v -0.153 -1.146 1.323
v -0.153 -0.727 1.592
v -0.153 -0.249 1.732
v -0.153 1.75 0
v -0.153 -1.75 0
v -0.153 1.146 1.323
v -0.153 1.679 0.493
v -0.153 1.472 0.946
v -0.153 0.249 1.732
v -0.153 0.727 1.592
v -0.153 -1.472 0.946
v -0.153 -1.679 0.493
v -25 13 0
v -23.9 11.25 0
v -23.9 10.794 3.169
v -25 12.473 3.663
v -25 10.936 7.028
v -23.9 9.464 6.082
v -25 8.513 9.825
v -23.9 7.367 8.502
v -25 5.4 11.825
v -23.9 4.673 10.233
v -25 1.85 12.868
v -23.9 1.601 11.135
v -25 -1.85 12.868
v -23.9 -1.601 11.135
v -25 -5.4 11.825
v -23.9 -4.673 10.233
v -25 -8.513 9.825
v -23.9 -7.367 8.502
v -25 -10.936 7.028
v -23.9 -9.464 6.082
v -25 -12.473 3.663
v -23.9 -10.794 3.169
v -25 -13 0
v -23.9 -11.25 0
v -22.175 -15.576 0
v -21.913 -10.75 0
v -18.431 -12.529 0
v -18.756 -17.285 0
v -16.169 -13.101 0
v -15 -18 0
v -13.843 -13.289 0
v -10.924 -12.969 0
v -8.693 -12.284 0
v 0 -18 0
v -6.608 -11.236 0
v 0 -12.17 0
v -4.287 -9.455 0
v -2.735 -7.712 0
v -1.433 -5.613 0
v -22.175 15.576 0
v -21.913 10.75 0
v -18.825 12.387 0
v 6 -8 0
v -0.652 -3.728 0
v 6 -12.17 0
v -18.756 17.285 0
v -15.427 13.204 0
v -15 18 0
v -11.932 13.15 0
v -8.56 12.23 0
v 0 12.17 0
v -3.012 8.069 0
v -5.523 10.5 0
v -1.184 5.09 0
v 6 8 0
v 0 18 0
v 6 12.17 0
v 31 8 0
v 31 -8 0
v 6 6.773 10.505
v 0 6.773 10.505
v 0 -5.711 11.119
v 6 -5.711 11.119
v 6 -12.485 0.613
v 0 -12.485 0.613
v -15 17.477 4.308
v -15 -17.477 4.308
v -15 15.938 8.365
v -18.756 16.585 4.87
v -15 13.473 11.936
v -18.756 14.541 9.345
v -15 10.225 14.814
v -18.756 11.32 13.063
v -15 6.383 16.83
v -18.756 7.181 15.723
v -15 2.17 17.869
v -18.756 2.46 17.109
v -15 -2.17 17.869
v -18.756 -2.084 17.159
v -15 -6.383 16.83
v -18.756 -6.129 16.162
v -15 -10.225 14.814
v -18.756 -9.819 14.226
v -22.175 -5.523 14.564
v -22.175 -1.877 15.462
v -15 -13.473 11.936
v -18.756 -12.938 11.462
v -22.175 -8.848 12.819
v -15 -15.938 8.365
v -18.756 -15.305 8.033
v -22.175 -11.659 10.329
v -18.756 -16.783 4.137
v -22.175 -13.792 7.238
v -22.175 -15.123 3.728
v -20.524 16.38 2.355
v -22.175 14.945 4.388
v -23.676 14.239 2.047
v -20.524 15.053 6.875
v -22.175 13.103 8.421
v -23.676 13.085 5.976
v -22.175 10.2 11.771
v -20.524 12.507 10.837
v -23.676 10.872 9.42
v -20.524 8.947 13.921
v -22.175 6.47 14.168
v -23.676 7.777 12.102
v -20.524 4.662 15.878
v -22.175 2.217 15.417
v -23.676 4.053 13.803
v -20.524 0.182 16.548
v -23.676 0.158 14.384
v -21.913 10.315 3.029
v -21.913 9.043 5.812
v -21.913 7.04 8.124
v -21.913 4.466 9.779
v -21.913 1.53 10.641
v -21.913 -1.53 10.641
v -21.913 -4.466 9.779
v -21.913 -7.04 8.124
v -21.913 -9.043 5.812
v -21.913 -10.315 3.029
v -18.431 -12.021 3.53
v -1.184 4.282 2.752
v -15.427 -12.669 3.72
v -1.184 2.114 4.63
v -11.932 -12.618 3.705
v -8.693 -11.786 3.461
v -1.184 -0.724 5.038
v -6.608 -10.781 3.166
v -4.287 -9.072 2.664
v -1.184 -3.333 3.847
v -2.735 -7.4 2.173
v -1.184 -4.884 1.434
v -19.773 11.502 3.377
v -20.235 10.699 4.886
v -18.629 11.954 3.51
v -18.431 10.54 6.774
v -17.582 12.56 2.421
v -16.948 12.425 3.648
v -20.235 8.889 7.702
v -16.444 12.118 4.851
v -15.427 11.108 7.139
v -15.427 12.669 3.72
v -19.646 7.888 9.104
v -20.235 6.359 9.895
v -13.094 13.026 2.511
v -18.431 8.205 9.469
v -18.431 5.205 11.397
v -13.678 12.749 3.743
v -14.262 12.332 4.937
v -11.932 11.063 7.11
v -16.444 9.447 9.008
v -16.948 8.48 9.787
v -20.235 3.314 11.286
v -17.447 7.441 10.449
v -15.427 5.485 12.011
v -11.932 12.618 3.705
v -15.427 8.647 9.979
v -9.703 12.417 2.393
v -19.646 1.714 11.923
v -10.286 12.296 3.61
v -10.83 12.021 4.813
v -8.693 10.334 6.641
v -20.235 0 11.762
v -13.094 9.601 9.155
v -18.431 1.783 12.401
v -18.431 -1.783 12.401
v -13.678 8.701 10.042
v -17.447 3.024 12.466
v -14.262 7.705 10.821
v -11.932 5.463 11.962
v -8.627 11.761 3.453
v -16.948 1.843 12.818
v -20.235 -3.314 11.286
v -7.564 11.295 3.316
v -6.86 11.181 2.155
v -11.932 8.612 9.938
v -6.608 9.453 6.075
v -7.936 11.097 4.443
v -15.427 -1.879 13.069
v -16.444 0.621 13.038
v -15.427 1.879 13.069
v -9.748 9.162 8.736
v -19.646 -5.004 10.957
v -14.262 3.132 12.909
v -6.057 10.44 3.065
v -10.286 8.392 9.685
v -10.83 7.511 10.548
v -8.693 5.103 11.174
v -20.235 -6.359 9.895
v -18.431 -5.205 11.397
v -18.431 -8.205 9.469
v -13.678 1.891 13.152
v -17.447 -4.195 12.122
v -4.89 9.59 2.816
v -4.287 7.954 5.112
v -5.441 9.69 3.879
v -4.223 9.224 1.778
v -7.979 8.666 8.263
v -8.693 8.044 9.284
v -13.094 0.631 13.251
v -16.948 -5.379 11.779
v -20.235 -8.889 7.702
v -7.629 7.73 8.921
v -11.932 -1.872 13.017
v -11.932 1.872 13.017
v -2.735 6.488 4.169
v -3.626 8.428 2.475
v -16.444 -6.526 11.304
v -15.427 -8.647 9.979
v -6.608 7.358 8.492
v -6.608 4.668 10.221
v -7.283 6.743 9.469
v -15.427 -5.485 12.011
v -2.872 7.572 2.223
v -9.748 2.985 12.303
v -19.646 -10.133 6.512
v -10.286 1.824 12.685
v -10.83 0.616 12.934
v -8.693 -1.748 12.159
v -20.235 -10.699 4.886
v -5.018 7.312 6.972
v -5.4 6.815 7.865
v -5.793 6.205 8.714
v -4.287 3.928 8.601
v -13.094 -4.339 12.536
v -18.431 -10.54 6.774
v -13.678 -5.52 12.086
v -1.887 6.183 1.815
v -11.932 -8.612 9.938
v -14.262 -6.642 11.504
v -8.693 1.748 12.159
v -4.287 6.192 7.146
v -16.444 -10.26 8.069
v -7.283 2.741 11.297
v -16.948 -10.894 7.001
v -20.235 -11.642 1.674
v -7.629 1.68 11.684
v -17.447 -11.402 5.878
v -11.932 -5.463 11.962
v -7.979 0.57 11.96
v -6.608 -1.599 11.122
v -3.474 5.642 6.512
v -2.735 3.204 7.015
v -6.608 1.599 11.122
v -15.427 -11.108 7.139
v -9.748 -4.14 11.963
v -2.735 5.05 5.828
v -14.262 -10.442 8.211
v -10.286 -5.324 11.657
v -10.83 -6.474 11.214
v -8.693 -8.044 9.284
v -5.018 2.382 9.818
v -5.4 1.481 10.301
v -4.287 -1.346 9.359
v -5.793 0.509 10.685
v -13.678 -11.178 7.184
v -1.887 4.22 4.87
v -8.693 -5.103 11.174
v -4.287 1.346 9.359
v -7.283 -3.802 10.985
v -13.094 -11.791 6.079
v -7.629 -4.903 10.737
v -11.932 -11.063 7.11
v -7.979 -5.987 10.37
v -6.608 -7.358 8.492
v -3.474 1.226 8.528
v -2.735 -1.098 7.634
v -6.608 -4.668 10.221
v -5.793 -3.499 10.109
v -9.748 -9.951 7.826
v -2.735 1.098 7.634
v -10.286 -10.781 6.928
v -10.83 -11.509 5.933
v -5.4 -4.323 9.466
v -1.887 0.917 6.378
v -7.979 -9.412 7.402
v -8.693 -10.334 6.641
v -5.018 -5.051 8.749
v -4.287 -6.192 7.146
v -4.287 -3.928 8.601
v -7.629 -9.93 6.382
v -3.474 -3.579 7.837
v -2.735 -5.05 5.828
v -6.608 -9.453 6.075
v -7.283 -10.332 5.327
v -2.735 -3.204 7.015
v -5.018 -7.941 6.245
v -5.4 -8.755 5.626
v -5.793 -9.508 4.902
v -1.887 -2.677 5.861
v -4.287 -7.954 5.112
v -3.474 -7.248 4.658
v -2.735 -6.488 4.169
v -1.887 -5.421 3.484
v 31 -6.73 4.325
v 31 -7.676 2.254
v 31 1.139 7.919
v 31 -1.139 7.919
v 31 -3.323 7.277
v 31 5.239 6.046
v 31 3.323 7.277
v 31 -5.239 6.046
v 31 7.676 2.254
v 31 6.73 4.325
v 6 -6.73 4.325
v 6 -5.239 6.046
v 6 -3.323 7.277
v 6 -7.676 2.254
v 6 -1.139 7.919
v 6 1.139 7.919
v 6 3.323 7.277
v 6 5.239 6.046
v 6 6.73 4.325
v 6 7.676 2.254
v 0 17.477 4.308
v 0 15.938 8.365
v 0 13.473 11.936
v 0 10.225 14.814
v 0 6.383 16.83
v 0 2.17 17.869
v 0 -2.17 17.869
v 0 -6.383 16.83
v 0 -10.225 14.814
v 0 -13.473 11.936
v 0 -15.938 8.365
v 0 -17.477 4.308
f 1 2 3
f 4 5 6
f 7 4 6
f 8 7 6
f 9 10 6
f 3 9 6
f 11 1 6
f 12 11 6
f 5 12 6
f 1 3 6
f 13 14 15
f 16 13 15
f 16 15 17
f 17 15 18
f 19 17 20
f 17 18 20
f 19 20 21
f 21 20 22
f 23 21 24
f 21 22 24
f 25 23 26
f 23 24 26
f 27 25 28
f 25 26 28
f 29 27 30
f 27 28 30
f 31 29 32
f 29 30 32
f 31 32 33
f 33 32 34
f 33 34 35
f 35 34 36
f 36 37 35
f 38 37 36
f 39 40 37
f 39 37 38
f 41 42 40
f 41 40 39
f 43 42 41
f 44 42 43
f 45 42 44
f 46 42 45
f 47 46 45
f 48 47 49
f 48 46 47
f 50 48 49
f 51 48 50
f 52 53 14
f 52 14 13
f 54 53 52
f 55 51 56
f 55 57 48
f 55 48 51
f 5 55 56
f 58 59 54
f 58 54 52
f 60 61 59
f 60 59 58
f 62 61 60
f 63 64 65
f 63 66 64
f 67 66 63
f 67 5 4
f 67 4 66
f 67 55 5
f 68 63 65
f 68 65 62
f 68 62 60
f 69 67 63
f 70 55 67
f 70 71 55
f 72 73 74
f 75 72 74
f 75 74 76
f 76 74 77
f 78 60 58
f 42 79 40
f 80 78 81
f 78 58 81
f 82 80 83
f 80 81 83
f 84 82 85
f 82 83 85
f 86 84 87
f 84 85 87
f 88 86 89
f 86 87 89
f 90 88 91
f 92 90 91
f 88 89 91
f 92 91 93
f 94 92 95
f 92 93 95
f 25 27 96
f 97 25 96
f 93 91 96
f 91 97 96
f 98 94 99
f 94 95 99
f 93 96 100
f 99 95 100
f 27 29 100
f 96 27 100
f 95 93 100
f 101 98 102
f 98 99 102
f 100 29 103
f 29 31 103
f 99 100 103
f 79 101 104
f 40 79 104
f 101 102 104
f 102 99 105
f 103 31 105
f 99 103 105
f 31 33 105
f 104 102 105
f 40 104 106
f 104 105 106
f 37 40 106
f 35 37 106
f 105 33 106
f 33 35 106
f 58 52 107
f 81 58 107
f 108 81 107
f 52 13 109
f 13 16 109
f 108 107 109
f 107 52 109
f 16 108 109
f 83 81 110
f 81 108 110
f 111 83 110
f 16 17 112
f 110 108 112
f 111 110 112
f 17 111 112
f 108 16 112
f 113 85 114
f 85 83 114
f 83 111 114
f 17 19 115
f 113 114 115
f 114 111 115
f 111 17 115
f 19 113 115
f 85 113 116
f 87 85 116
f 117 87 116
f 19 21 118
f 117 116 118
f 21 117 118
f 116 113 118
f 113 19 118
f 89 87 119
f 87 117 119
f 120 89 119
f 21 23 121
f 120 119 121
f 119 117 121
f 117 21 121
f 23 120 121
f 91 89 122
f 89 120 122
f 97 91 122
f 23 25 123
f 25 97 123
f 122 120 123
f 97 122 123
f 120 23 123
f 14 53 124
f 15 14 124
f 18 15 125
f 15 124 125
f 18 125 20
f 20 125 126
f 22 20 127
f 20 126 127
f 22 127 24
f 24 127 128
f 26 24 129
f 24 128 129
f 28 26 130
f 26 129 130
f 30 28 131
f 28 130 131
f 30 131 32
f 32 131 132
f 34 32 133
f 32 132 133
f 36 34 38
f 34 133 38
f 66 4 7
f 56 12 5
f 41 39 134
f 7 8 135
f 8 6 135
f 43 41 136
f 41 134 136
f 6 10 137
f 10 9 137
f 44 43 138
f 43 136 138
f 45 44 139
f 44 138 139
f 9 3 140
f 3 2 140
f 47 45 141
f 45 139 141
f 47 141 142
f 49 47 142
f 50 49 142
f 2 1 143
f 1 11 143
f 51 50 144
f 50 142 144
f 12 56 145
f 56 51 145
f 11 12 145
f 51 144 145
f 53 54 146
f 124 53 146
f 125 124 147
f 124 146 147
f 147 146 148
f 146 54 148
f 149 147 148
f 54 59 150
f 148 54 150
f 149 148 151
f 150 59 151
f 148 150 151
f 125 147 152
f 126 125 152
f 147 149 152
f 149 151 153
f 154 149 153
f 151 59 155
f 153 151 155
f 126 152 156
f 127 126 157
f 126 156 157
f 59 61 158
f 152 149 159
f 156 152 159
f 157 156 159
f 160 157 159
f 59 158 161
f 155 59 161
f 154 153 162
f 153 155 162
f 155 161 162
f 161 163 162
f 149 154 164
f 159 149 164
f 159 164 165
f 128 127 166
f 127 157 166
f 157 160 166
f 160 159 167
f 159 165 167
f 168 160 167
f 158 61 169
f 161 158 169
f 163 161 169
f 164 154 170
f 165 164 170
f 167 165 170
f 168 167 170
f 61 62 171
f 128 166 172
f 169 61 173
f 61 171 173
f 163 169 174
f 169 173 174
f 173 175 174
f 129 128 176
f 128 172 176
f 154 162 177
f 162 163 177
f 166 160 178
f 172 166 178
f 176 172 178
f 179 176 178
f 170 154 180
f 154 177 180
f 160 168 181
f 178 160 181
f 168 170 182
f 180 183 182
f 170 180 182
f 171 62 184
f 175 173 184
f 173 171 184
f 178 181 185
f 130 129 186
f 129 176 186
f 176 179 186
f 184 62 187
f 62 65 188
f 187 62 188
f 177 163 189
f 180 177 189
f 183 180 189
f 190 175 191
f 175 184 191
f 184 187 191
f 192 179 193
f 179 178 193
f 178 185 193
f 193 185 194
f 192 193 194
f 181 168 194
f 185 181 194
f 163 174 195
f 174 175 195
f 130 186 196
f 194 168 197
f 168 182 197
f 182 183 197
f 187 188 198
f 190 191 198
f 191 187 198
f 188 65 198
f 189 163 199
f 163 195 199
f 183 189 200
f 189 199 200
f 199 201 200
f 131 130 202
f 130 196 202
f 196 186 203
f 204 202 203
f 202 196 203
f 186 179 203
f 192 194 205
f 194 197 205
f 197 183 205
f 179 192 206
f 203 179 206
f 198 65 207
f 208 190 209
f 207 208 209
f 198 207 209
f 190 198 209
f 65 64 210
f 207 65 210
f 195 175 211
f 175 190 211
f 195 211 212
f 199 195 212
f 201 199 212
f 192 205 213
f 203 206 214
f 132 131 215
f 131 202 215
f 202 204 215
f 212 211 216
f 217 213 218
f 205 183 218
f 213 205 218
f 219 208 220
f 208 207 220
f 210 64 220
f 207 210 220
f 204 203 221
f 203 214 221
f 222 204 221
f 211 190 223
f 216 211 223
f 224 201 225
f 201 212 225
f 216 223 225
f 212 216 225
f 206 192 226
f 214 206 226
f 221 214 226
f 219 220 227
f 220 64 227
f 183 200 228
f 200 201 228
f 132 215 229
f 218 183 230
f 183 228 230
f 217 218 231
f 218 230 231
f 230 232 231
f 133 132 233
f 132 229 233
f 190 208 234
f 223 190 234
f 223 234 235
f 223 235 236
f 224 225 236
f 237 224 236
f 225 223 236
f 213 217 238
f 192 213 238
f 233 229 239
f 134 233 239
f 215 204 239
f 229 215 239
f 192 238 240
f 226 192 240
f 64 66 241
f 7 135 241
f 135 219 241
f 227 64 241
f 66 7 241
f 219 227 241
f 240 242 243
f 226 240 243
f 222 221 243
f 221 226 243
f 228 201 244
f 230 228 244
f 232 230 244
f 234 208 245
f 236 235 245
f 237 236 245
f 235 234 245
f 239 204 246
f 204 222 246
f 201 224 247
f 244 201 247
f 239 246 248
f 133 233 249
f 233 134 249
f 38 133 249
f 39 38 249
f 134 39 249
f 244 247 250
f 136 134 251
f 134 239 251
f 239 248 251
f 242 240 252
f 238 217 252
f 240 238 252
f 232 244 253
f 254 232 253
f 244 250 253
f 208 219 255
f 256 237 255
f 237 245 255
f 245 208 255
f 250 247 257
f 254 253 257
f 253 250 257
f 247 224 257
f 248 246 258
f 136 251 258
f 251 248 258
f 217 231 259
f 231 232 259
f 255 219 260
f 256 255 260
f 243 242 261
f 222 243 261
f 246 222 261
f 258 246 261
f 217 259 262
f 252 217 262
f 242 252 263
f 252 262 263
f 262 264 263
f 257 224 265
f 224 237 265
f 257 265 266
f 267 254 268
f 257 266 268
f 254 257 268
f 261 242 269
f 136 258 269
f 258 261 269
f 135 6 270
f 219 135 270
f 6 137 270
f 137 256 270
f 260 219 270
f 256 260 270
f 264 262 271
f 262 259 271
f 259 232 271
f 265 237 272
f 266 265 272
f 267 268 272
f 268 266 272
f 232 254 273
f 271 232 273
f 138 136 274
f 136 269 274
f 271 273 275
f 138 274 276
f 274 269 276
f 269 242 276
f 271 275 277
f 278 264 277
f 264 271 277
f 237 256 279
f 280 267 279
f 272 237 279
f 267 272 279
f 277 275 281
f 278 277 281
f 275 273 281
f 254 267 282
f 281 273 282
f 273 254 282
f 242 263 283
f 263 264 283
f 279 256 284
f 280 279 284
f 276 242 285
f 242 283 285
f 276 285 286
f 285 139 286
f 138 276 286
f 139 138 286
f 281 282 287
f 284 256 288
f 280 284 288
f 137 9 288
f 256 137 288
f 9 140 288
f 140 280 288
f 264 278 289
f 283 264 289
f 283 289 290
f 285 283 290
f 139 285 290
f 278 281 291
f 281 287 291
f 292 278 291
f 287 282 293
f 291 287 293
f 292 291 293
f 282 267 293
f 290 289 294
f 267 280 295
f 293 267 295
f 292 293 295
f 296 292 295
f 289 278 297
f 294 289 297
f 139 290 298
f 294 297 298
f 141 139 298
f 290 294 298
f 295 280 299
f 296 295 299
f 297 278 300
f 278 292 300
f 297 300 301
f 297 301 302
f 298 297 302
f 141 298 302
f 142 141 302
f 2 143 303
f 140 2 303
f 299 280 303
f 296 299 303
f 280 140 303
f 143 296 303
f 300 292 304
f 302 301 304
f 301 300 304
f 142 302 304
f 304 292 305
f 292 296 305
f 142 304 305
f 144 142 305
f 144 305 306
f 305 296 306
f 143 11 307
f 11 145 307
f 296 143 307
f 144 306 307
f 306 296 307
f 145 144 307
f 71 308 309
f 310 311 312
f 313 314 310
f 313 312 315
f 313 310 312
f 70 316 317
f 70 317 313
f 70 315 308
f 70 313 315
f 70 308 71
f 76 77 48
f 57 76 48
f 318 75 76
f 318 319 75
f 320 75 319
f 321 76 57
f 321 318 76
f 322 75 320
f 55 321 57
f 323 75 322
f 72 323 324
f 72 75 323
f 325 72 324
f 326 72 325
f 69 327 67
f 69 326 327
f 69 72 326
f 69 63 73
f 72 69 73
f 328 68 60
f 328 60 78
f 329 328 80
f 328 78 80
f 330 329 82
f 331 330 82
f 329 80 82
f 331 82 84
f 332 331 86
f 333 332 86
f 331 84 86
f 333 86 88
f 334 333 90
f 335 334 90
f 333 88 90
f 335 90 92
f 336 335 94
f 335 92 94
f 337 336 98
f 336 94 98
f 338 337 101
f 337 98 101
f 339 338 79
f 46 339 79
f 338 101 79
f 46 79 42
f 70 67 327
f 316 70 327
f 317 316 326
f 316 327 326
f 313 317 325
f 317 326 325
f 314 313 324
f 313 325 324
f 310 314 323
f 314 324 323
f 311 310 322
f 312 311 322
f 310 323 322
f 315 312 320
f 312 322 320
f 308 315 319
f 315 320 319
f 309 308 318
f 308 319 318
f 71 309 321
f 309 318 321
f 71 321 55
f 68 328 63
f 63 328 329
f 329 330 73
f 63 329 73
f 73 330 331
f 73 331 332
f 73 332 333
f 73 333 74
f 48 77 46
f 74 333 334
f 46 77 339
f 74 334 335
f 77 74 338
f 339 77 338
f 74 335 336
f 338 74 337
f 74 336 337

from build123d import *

# Parameters (mm, degrees)
Y_KSEKLIK_EKSTR_ZYON1_DEPTH = 6
IZIM3_R                     = 8
BOSS_EXTRUDE1_DEPTH         = 25
SKETCH3_W                   = 31.552756476
SKETCH3_H                   = 60.481987933
CUT_EXTRUDE2_DEPTH          = 67


with BuildPart() as part:
    # Çizim1 → Döndür1 (revolve)
    with BuildSketch(Plane.XY):
        with BuildLine():
            Line((-25, 13), (-23.9, 11.25))
            Line((-23.9, 11.25), (-21.913347284, 10.75))
            ThreePointArc((-21.913347284, 10.75), (-8.560110762, 12.229864882), (-0.153484939, 1.75))
            Line((-0.153484939, 1.75), (-0.153484939, 0))
            Line((-0.153484939, 0), (0, 0))
            Line((0, 0), (0, 18))
            Line((0, 18), (-15, 18))
            ThreePointArc((-15, 18), (-20.524257416, 16.548514832), (-25, 13))
        make_face()
    revolve(axis=Axis((-0.153484939, 0, 0), (1, 0, 0)))

    # Çizim2 → Yükseklik-Ekstrüzyon1 (add)
    with BuildSketch(Plane(origin=(0, 0, 0), x_dir=(0, 0, -1), z_dir=(1, 0, 0))):
        Polygon((-0.613358655, -12.484575463), (10.505280179, -6.773471909), (11.118638834, 5.711103554), (0.613358655, 12.484575463), (-10.505280179, 6.773471909), (-11.118638834, -5.711103554), align=None)
    extrude(amount=Y_KSEKLIK_EKSTR_ZYON1_DEPTH)

    # Çizim3 → Boss-Extrude1 (add)
    with BuildSketch(Plane(origin=(6, 0, 0), x_dir=(0, 0, -1), z_dir=(1, 0, 0))):
        Circle(IZIM3_R)
    extrude(amount=BOSS_EXTRUDE1_DEPTH)

    # Sketch3 → Cut-Extrude2 (cut)
    with BuildSketch(Plane(origin=(31, 0, 0), x_dir=(0, 0, -1), z_dir=(1, 0, 0))):
        with Locations((15.776378238, -7.418738571)):
            Rectangle(SKETCH3_W, SKETCH3_H)
    extrude(amount=-CUT_EXTRUDE2_DEPTH, mode=Mode.SUBTRACT)


solid = part.part
